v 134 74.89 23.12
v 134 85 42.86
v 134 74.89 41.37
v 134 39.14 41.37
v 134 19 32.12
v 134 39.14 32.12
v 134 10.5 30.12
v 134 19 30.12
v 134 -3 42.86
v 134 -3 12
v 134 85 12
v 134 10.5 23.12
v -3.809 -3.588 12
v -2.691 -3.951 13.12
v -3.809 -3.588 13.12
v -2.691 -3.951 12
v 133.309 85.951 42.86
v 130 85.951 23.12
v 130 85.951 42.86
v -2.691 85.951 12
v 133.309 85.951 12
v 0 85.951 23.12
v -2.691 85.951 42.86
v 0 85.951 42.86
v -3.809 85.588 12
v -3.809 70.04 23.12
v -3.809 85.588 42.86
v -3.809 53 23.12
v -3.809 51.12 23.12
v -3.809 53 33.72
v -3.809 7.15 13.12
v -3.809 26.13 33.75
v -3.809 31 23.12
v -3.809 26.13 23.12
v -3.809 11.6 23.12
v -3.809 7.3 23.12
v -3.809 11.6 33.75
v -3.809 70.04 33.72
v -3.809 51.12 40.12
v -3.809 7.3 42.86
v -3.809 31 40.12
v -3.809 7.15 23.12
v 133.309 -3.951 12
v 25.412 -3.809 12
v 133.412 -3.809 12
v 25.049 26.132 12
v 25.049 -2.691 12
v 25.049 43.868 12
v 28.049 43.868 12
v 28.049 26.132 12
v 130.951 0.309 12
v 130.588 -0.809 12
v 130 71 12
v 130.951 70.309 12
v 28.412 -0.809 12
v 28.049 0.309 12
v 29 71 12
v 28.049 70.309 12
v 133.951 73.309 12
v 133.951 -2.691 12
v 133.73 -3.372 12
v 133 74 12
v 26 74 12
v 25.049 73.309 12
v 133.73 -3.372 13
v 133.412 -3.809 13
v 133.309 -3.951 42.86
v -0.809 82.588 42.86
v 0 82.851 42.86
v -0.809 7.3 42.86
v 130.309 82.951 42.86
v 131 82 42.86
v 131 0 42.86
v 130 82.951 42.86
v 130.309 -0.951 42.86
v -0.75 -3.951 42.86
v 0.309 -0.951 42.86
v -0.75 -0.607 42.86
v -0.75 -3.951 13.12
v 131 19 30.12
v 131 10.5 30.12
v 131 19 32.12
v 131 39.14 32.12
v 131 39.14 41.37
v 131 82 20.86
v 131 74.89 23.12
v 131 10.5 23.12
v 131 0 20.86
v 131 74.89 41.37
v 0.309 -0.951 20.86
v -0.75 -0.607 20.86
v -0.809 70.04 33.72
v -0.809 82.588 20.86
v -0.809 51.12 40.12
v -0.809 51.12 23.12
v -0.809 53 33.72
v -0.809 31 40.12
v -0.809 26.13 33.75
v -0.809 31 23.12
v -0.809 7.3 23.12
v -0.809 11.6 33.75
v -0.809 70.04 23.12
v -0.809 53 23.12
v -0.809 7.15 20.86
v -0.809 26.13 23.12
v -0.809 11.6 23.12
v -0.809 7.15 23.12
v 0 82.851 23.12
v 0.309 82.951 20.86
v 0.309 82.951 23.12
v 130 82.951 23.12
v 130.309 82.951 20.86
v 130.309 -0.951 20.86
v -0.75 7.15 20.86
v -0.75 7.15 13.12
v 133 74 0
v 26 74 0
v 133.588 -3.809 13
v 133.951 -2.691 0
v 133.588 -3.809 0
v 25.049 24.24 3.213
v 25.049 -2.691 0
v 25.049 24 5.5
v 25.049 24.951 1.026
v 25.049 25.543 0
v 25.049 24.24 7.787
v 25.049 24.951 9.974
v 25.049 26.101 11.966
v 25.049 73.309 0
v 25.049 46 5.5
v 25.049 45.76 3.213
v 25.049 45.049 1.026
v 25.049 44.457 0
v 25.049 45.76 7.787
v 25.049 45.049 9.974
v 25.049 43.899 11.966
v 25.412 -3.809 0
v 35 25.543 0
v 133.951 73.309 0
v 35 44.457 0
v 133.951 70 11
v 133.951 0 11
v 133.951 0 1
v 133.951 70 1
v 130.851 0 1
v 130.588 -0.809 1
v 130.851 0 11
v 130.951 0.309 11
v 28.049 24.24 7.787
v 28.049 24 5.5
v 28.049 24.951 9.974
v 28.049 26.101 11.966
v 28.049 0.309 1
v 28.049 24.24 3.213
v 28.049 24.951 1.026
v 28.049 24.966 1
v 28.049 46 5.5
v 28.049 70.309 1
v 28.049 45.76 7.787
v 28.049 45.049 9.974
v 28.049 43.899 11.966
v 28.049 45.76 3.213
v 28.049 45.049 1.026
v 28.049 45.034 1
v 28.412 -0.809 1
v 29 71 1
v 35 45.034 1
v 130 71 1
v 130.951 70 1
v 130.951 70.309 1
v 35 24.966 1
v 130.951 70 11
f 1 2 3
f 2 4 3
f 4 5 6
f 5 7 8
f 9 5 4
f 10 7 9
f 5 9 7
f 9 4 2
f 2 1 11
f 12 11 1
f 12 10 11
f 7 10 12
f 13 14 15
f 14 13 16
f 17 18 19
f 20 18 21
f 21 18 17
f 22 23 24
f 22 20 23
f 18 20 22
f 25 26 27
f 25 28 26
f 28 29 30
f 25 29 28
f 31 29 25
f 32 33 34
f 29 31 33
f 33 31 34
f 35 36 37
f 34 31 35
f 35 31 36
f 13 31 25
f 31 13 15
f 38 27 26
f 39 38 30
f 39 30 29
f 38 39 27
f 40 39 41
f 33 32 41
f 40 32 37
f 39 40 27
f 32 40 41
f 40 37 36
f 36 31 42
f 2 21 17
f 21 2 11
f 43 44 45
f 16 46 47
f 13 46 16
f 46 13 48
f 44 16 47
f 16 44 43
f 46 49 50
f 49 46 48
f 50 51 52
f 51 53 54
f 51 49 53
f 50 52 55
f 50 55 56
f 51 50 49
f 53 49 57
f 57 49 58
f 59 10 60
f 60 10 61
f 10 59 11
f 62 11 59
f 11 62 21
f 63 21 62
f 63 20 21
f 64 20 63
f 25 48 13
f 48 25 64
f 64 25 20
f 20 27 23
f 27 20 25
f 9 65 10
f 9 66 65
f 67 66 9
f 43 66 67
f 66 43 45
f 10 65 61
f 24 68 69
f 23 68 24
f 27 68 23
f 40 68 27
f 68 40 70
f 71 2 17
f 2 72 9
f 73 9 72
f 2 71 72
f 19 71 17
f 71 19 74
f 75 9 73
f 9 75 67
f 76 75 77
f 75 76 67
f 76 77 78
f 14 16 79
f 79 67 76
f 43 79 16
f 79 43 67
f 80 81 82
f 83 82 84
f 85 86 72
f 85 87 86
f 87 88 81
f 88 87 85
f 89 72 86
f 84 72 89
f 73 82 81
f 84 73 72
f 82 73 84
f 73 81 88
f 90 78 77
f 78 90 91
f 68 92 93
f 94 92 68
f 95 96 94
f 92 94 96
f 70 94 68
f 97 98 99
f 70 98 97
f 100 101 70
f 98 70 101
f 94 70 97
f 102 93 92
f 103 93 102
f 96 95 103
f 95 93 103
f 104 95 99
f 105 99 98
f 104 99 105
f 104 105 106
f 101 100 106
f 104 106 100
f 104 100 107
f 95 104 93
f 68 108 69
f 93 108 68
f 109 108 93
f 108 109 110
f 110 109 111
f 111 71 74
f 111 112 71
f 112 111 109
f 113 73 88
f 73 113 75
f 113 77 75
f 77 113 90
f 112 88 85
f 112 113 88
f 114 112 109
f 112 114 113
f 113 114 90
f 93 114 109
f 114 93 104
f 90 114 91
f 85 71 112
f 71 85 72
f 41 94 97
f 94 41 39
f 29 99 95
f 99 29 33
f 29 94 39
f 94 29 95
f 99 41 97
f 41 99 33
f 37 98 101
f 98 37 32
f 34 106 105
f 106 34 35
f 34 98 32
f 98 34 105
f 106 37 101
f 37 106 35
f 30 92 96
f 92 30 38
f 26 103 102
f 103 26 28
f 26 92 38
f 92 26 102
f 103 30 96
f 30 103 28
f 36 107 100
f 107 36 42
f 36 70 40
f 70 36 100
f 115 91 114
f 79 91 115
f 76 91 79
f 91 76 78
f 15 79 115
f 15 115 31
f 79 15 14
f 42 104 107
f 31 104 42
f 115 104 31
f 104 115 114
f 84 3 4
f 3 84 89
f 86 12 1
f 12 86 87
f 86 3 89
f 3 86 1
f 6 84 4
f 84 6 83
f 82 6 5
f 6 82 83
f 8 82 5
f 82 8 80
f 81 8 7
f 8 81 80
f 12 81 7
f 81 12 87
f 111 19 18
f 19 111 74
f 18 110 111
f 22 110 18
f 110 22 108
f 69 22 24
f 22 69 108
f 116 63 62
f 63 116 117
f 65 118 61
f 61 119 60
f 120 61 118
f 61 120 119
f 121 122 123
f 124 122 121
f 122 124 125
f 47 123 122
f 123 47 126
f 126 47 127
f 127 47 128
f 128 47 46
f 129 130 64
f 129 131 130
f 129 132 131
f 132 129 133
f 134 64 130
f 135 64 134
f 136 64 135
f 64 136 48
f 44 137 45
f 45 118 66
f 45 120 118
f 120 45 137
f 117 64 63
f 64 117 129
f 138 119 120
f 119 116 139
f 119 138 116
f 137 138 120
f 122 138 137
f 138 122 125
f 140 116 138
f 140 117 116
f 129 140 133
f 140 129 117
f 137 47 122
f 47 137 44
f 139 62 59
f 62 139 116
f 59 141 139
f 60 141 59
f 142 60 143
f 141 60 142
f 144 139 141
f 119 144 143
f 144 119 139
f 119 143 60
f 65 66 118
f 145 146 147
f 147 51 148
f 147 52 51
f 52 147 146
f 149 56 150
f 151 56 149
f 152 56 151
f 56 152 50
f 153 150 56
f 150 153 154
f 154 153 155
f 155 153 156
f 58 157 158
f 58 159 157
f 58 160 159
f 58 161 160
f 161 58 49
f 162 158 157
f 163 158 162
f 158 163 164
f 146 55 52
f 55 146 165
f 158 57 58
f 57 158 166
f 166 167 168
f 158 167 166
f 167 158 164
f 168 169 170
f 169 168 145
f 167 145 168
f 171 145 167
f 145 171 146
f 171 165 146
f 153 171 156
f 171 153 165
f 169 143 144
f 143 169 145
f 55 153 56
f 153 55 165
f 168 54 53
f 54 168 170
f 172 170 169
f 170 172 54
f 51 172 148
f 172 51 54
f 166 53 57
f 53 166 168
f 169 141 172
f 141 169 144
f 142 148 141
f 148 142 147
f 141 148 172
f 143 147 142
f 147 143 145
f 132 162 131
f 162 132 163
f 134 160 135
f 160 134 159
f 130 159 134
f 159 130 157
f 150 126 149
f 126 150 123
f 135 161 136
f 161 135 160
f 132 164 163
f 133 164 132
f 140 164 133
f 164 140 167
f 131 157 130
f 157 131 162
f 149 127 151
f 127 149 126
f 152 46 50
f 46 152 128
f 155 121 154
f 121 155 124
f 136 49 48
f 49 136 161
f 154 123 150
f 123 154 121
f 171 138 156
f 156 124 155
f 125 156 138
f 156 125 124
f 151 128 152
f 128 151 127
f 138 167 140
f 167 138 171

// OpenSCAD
// file: ../hdd_case/case.scad
module case (width, length, wall_height, wall_thickness, x_offset, y_offset, z_offset){
    //Negative space
    top_right_point = [width + x_offset, length + y_offset, z_offset];
    top_left_point = [width + x_offset, y_offset, z_offset];
    bottom_right_point = [x_offset, length + y_offset, z_offset];
    bottom_left_point = [x_offset, y_offset, z_offset];

    //Base space
    top_right_point_base = [width + wall_thickness, length + wall_thickness, 0];
    top_left_point_base = [width + wall_thickness, -wall_thickness, 0];
    bottom_right_point_base = [-wall_thickness, length + wall_thickness, 0];
    bottom_left_point_base = [-wall_thickness, -wall_thickness, 0];
    
    //Lists for the for loops
    base_points = [top_right_point_base, top_left_point_base, bottom_right_point_base, bottom_left_point_base];
    points = [top_right_point, top_left_point, bottom_right_point, bottom_left_point];

    difference(){
        hull(){
            for (point = base_points){
                translate(point){
                    cylinder(height);
                }
            }
        }
        hull(){
            for (point = points){
                translate(point){
                    cylinder(height);
                }
            }
        }
    }
}

module roofed_case(width, length, wall_height, wall_thickness, x_offset, y_offset, z_offset, roof_thickness){
    case(width, length, wall_height, wall_thickness, x_offset, y_offset, z_offset);
    top_right_point_base = [width + wall_thickness, length + wall_thickness, wall_height];
    top_left_point_base = [width + wall_thickness, -wall_thickness, wall_height ];
    bottom_right_point_base = [-wall_thickness, length + wall_thickness, wall_height];
    bottom_left_point_base = [-wall_thickness, -wall_thickness, wall_height];
    points = [top_right_point_base, top_left_point_base, bottom_right_point_base, bottom_left_point_base];
    hull(){
           for(point = points){
               translate(point) cylinder(roof_thickness);
           }
    }
    
}

//Changeable values
width = 100;
length = 100;
wall_height = 10;
x_offset = 0;
y_offset = 0;
z_offset = 1;
wall_thickness = 3;
roof_thickness = 3;

//Non-changeable values
height = z_offset + wall_height;

//This is for making sure it renders correctly
/*
translate([0, 0, wall_height + 10]){
    case(width,
        length,
        wall_height,
        wall_thickness,
        x_offset,
        y_offset,
        z_offset);
}

roofed_case(width,
     length,
     wall_height,
     wall_thickness,
     x_offset,
     y_offset,
     z_offset);
*/
// file: case.scad
module case (width, length, wall_height, wall_thickness, x_offset, y_offset, z_offset){
    //Negative space
    top_right_point = [width + x_offset, length + y_offset, z_offset];
    top_left_point = [width + x_offset, y_offset, z_offset];
    bottom_right_point = [x_offset, length + y_offset, z_offset];
    bottom_left_point = [x_offset, y_offset, z_offset];

    //Base space
    top_right_point_base = [width + wall_thickness, length + wall_thickness, 0];
    top_left_point_base = [width + wall_thickness, -wall_thickness, 0];
    bottom_right_point_base = [-wall_thickness, length + wall_thickness, 0];
    bottom_left_point_base = [-wall_thickness, -wall_thickness, 0];
    
    //Lists for the for loops
    base_points = [top_right_point_base, top_left_point_base, bottom_right_point_base, bottom_left_point_base];
    points = [top_right_point, top_left_point, bottom_right_point, bottom_left_point];

    difference(){
        hull(){
            for (point = base_points){
                translate(point){
                    cylinder(height);
                }
            }
        }
        hull(){
            for (point = points){
                translate(point){
                    cylinder(height);
                }
            }
        }
    }
}

module roofed_case(width, length, wall_height, wall_thickness, x_offset, y_offset, z_offset, roof_thickness){
    case(width, length, wall_height, wall_thickness, x_offset, y_offset, z_offset);
    top_right_point_base = [width + wall_thickness, length + wall_thickness, wall_height];
    top_left_point_base = [width + wall_thickness, -wall_thickness, wall_height ];
    bottom_right_point_base = [-wall_thickness, length + wall_thickness, wall_height];
    bottom_left_point_base = [-wall_thickness, -wall_thickness, wall_height];
    points = [top_right_point_base, top_left_point_base, bottom_right_point_base, bottom_left_point_base];
    hull(){
           for(point = points){
               translate(point) cylinder(roof_thickness);
           }
    }
    
}

//Changeable values
width = 100;
length = 100;
wall_height = 10;
x_offset = 0;
y_offset = 0;
z_offset = 1;
wall_thickness = 3;
roof_thickness = 3;

//Non-changeable values
height = z_offset + wall_height;

//This is for making sure it renders correctly
/*
translate([0, 0, wall_height + 10]){
    case(width,
        length,
        wall_height,
        wall_thickness,
        x_offset,
        y_offset,
        z_offset);
}

roofed_case(width,
     length,
     wall_height,
     wall_thickness,
     x_offset,
     y_offset,
     z_offset);
*/
// file: ../hdd_case/2.5in_case.scad
include<case.scad>

//Changeable values
width = 70;
length = 101;
wall_height = 12;
x_offset = 0;
y_offset = 0;
z_offset = 1;
wall_thickness = 3;

//Opening
disk_x = 70;
disk_y = wall_thickness + 3;
disk_z = 10;
position_disk_x = 0;
position_disk_y = -4;
position_disk_z = z_offset;

//Manual eject
heigh_eject = 10;
radius_1_eject = 22/2;
radius_2_eject = 22/2;
position_eject_x = width/2;
position_eject_y = 105;
position_eject_z = radius_1_eject/2;
rotate_eject_x = 90;
rotate_eject_y = 0;
rotate_eject_z = -0;

//Non-changeable values
height = z_offset + wall_height;

module make_25_holder(){
	difference(){
		roofed_case(width,
		     length,
		     wall_height,
		     wall_thickness,
		     x_offset,
		     y_offset,
		     z_offset);
		translate([position_disk_x, position_disk_y, position_disk_z]) {
		    color([0, 1, 0]) cube([disk_x, disk_y, disk_z]);
		}
		translate([position_eject_x, position_eject_y, position_eject_z]){
		    rotate([rotate_eject_x, rotate_eject_y, rotate_eject_z]){
			    color([0, 1, 0]) cylinder(heigh_eject, radius_1_eject, radius_2_eject);
		    }
		}
	}
}

make_25_holder();
// file: case_with_port_holes.scad
//Editiable values
include<case.scad>

//Case values
width = 130;
length = 82;
wall_height = 22;
x_offset = 0;
y_offset = 0;
z_offset = 8.86;
wall_thickness = 3;


//Offset_value
backside_x_offset = -4;
frontside_x_offset = width;
port_z_offset = z_offset + 2.26;
port_y_offset = length;

//Ethernet
ethernet_x = 20.12;
ethernet_y = 21.22;
ethernet_z = 17;
ethernet_position_x = backside_x_offset;
ethernet_position_y = 31;
ethernet_position_z = port_z_offset;

//Power
power_cable_x = 11.58;
power_cable_y = 14.53;
power_cable_z = 10.63;
power_cable_position_x = backside_x_offset;
power_cable_position_y = 11.6;
power_cable_position_z = port_z_offset;

//HDMI
hdmi_x = 11.43;
hdmi_y = 17.04;
hdmi_z = 10.6;
hdmi_position_x = backside_x_offset;
hdmi_position_y = 53;
hdmi_position_z = port_z_offset;

//SATA Main Card
sata_x = 67.5;
sata_y = 7.3;
sata_z = 58.18;
sata_position_x = backside_x_offset;
sata_position_y = 0;
sata_position_z = port_z_offset;


//Face SATA card
sata_face_x = 3.25;
sata_face_y = 15.15;
sata_face_z = 80;
sata_face_position_x = backside_x_offset;
sata_face_position_y = -8;
sata_face_position_z = port_z_offset -10;

//USB1
usb1_x = 10;
usb1_y = 18.25;
usb1_z = 18.25;
usb1_position_x = frontside_x_offset;
usb1_position_y = 56.64;
usb1_position_z = port_z_offset;

//USB2
usb2_x = 10;
usb2_y = 18.25;
usb2_z = 18.25;
usb2_position_x = frontside_x_offset;
usb2_position_y = 39.14;
usb2_position_z = port_z_offset;

//Power buttom
power_button_x = 10;
power_button_y = 16.25;
power_button_z = 9;
power_button_position_x = frontside_x_offset;
power_button_position_y = 19;
power_button_position_z = port_z_offset;

//Reset button
reset_button_x = 10;
reset_button_y = 16.25;
reset_button_z = 9;
reset_button_position_x = frontside_x_offset;
reset_button_position_y = 29;
reset_button_position_z = port_z_offset;

//Audio
audio_x = 10;
audio_y = 13;
audio_z = 7;
audio_position_x = frontside_x_offset;
audio_position_y = 10.5;
audio_position_z = port_z_offset;

//Side load
side_x = 130;
side_y = 10;
side_z = 20;
side_position_x = 0;
side_position_y = port_y_offset;
side_position_z = port_z_offset;

//The box
module make_case(){
	difference(){
		case(width,
		     length,
		     wall_height,
		     wall_thickness,
		     x_offset,
		     y_offset,
		     z_offset);
		/*translate([-4, -10, 0]){
			color([1, 0, 0]) cube([135, 100, 10]);
		}*/
		translate([ethernet_position_x, ethernet_position_y, ethernet_position_z]){
			color([0, 1, 0]) cube([ethernet_x, ethernet_x, ethernet_z]);
		}
		translate([power_cable_position_x, power_cable_position_y, power_cable_position_z]){
			color([0, 1, 0]) cube([power_cable_x, power_cable_y, power_cable_z]);
		}
		translate([hdmi_position_x, hdmi_position_y, hdmi_position_z]){
			color([0, 1, 0]) cube([hdmi_x, hdmi_y, hdmi_z]);
		}
		translate([sata_position_x, sata_position_y, sata_position_z]){
			color([0, 1, 0]) cube([sata_x, sata_y, sata_z]);
		}
		translate([sata_face_position_x, sata_face_position_y, sata_face_position_z]){
			color([0, 1, 0]) cube([sata_face_x, sata_face_y, sata_face_z]);
		}
		translate([usb1_position_x, usb1_position_y, usb1_position_z]){
			color([0, 1, 0]) cube([usb1_x, usb1_y, usb1_z]);
		}
		translate([usb2_position_x, usb2_position_y, usb2_position_z]){
			color([0, 1, 0]) cube([usb2_x, usb2_y, usb2_z]);
		}
		translate([power_button_position_x, power_button_position_y, power_button_position_z]){
			color([0, 1, 0]) cube([power_button_x, power_button_y, power_button_z]);
		}
		translate([reset_button_position_x, reset_button_position_y, reset_button_position_z]){
			color([0, 1, 0]) cube([reset_button_x, reset_button_y, reset_button_z]);
		}
		translate([audio_position_x, audio_position_y, audio_position_z]){
			color([0, 1, 0]) cube([audio_x, audio_y, audio_z]);
		}
		translate([side_position_x, side_position_y, side_position_z]){
			color([0, 1, 0]) cube([side_x, side_y, side_z]);
		}
	}
}
make_case();
// main file
use <case_with_port_holes.scad>
use <../hdd_case/2.5in_case.scad>

translate([0, 0, 12]){
    make_case();
}

translate([130, 0, 0]){
	rotate([0, 0, 90]){
	    make_25_holder();
    }
}
